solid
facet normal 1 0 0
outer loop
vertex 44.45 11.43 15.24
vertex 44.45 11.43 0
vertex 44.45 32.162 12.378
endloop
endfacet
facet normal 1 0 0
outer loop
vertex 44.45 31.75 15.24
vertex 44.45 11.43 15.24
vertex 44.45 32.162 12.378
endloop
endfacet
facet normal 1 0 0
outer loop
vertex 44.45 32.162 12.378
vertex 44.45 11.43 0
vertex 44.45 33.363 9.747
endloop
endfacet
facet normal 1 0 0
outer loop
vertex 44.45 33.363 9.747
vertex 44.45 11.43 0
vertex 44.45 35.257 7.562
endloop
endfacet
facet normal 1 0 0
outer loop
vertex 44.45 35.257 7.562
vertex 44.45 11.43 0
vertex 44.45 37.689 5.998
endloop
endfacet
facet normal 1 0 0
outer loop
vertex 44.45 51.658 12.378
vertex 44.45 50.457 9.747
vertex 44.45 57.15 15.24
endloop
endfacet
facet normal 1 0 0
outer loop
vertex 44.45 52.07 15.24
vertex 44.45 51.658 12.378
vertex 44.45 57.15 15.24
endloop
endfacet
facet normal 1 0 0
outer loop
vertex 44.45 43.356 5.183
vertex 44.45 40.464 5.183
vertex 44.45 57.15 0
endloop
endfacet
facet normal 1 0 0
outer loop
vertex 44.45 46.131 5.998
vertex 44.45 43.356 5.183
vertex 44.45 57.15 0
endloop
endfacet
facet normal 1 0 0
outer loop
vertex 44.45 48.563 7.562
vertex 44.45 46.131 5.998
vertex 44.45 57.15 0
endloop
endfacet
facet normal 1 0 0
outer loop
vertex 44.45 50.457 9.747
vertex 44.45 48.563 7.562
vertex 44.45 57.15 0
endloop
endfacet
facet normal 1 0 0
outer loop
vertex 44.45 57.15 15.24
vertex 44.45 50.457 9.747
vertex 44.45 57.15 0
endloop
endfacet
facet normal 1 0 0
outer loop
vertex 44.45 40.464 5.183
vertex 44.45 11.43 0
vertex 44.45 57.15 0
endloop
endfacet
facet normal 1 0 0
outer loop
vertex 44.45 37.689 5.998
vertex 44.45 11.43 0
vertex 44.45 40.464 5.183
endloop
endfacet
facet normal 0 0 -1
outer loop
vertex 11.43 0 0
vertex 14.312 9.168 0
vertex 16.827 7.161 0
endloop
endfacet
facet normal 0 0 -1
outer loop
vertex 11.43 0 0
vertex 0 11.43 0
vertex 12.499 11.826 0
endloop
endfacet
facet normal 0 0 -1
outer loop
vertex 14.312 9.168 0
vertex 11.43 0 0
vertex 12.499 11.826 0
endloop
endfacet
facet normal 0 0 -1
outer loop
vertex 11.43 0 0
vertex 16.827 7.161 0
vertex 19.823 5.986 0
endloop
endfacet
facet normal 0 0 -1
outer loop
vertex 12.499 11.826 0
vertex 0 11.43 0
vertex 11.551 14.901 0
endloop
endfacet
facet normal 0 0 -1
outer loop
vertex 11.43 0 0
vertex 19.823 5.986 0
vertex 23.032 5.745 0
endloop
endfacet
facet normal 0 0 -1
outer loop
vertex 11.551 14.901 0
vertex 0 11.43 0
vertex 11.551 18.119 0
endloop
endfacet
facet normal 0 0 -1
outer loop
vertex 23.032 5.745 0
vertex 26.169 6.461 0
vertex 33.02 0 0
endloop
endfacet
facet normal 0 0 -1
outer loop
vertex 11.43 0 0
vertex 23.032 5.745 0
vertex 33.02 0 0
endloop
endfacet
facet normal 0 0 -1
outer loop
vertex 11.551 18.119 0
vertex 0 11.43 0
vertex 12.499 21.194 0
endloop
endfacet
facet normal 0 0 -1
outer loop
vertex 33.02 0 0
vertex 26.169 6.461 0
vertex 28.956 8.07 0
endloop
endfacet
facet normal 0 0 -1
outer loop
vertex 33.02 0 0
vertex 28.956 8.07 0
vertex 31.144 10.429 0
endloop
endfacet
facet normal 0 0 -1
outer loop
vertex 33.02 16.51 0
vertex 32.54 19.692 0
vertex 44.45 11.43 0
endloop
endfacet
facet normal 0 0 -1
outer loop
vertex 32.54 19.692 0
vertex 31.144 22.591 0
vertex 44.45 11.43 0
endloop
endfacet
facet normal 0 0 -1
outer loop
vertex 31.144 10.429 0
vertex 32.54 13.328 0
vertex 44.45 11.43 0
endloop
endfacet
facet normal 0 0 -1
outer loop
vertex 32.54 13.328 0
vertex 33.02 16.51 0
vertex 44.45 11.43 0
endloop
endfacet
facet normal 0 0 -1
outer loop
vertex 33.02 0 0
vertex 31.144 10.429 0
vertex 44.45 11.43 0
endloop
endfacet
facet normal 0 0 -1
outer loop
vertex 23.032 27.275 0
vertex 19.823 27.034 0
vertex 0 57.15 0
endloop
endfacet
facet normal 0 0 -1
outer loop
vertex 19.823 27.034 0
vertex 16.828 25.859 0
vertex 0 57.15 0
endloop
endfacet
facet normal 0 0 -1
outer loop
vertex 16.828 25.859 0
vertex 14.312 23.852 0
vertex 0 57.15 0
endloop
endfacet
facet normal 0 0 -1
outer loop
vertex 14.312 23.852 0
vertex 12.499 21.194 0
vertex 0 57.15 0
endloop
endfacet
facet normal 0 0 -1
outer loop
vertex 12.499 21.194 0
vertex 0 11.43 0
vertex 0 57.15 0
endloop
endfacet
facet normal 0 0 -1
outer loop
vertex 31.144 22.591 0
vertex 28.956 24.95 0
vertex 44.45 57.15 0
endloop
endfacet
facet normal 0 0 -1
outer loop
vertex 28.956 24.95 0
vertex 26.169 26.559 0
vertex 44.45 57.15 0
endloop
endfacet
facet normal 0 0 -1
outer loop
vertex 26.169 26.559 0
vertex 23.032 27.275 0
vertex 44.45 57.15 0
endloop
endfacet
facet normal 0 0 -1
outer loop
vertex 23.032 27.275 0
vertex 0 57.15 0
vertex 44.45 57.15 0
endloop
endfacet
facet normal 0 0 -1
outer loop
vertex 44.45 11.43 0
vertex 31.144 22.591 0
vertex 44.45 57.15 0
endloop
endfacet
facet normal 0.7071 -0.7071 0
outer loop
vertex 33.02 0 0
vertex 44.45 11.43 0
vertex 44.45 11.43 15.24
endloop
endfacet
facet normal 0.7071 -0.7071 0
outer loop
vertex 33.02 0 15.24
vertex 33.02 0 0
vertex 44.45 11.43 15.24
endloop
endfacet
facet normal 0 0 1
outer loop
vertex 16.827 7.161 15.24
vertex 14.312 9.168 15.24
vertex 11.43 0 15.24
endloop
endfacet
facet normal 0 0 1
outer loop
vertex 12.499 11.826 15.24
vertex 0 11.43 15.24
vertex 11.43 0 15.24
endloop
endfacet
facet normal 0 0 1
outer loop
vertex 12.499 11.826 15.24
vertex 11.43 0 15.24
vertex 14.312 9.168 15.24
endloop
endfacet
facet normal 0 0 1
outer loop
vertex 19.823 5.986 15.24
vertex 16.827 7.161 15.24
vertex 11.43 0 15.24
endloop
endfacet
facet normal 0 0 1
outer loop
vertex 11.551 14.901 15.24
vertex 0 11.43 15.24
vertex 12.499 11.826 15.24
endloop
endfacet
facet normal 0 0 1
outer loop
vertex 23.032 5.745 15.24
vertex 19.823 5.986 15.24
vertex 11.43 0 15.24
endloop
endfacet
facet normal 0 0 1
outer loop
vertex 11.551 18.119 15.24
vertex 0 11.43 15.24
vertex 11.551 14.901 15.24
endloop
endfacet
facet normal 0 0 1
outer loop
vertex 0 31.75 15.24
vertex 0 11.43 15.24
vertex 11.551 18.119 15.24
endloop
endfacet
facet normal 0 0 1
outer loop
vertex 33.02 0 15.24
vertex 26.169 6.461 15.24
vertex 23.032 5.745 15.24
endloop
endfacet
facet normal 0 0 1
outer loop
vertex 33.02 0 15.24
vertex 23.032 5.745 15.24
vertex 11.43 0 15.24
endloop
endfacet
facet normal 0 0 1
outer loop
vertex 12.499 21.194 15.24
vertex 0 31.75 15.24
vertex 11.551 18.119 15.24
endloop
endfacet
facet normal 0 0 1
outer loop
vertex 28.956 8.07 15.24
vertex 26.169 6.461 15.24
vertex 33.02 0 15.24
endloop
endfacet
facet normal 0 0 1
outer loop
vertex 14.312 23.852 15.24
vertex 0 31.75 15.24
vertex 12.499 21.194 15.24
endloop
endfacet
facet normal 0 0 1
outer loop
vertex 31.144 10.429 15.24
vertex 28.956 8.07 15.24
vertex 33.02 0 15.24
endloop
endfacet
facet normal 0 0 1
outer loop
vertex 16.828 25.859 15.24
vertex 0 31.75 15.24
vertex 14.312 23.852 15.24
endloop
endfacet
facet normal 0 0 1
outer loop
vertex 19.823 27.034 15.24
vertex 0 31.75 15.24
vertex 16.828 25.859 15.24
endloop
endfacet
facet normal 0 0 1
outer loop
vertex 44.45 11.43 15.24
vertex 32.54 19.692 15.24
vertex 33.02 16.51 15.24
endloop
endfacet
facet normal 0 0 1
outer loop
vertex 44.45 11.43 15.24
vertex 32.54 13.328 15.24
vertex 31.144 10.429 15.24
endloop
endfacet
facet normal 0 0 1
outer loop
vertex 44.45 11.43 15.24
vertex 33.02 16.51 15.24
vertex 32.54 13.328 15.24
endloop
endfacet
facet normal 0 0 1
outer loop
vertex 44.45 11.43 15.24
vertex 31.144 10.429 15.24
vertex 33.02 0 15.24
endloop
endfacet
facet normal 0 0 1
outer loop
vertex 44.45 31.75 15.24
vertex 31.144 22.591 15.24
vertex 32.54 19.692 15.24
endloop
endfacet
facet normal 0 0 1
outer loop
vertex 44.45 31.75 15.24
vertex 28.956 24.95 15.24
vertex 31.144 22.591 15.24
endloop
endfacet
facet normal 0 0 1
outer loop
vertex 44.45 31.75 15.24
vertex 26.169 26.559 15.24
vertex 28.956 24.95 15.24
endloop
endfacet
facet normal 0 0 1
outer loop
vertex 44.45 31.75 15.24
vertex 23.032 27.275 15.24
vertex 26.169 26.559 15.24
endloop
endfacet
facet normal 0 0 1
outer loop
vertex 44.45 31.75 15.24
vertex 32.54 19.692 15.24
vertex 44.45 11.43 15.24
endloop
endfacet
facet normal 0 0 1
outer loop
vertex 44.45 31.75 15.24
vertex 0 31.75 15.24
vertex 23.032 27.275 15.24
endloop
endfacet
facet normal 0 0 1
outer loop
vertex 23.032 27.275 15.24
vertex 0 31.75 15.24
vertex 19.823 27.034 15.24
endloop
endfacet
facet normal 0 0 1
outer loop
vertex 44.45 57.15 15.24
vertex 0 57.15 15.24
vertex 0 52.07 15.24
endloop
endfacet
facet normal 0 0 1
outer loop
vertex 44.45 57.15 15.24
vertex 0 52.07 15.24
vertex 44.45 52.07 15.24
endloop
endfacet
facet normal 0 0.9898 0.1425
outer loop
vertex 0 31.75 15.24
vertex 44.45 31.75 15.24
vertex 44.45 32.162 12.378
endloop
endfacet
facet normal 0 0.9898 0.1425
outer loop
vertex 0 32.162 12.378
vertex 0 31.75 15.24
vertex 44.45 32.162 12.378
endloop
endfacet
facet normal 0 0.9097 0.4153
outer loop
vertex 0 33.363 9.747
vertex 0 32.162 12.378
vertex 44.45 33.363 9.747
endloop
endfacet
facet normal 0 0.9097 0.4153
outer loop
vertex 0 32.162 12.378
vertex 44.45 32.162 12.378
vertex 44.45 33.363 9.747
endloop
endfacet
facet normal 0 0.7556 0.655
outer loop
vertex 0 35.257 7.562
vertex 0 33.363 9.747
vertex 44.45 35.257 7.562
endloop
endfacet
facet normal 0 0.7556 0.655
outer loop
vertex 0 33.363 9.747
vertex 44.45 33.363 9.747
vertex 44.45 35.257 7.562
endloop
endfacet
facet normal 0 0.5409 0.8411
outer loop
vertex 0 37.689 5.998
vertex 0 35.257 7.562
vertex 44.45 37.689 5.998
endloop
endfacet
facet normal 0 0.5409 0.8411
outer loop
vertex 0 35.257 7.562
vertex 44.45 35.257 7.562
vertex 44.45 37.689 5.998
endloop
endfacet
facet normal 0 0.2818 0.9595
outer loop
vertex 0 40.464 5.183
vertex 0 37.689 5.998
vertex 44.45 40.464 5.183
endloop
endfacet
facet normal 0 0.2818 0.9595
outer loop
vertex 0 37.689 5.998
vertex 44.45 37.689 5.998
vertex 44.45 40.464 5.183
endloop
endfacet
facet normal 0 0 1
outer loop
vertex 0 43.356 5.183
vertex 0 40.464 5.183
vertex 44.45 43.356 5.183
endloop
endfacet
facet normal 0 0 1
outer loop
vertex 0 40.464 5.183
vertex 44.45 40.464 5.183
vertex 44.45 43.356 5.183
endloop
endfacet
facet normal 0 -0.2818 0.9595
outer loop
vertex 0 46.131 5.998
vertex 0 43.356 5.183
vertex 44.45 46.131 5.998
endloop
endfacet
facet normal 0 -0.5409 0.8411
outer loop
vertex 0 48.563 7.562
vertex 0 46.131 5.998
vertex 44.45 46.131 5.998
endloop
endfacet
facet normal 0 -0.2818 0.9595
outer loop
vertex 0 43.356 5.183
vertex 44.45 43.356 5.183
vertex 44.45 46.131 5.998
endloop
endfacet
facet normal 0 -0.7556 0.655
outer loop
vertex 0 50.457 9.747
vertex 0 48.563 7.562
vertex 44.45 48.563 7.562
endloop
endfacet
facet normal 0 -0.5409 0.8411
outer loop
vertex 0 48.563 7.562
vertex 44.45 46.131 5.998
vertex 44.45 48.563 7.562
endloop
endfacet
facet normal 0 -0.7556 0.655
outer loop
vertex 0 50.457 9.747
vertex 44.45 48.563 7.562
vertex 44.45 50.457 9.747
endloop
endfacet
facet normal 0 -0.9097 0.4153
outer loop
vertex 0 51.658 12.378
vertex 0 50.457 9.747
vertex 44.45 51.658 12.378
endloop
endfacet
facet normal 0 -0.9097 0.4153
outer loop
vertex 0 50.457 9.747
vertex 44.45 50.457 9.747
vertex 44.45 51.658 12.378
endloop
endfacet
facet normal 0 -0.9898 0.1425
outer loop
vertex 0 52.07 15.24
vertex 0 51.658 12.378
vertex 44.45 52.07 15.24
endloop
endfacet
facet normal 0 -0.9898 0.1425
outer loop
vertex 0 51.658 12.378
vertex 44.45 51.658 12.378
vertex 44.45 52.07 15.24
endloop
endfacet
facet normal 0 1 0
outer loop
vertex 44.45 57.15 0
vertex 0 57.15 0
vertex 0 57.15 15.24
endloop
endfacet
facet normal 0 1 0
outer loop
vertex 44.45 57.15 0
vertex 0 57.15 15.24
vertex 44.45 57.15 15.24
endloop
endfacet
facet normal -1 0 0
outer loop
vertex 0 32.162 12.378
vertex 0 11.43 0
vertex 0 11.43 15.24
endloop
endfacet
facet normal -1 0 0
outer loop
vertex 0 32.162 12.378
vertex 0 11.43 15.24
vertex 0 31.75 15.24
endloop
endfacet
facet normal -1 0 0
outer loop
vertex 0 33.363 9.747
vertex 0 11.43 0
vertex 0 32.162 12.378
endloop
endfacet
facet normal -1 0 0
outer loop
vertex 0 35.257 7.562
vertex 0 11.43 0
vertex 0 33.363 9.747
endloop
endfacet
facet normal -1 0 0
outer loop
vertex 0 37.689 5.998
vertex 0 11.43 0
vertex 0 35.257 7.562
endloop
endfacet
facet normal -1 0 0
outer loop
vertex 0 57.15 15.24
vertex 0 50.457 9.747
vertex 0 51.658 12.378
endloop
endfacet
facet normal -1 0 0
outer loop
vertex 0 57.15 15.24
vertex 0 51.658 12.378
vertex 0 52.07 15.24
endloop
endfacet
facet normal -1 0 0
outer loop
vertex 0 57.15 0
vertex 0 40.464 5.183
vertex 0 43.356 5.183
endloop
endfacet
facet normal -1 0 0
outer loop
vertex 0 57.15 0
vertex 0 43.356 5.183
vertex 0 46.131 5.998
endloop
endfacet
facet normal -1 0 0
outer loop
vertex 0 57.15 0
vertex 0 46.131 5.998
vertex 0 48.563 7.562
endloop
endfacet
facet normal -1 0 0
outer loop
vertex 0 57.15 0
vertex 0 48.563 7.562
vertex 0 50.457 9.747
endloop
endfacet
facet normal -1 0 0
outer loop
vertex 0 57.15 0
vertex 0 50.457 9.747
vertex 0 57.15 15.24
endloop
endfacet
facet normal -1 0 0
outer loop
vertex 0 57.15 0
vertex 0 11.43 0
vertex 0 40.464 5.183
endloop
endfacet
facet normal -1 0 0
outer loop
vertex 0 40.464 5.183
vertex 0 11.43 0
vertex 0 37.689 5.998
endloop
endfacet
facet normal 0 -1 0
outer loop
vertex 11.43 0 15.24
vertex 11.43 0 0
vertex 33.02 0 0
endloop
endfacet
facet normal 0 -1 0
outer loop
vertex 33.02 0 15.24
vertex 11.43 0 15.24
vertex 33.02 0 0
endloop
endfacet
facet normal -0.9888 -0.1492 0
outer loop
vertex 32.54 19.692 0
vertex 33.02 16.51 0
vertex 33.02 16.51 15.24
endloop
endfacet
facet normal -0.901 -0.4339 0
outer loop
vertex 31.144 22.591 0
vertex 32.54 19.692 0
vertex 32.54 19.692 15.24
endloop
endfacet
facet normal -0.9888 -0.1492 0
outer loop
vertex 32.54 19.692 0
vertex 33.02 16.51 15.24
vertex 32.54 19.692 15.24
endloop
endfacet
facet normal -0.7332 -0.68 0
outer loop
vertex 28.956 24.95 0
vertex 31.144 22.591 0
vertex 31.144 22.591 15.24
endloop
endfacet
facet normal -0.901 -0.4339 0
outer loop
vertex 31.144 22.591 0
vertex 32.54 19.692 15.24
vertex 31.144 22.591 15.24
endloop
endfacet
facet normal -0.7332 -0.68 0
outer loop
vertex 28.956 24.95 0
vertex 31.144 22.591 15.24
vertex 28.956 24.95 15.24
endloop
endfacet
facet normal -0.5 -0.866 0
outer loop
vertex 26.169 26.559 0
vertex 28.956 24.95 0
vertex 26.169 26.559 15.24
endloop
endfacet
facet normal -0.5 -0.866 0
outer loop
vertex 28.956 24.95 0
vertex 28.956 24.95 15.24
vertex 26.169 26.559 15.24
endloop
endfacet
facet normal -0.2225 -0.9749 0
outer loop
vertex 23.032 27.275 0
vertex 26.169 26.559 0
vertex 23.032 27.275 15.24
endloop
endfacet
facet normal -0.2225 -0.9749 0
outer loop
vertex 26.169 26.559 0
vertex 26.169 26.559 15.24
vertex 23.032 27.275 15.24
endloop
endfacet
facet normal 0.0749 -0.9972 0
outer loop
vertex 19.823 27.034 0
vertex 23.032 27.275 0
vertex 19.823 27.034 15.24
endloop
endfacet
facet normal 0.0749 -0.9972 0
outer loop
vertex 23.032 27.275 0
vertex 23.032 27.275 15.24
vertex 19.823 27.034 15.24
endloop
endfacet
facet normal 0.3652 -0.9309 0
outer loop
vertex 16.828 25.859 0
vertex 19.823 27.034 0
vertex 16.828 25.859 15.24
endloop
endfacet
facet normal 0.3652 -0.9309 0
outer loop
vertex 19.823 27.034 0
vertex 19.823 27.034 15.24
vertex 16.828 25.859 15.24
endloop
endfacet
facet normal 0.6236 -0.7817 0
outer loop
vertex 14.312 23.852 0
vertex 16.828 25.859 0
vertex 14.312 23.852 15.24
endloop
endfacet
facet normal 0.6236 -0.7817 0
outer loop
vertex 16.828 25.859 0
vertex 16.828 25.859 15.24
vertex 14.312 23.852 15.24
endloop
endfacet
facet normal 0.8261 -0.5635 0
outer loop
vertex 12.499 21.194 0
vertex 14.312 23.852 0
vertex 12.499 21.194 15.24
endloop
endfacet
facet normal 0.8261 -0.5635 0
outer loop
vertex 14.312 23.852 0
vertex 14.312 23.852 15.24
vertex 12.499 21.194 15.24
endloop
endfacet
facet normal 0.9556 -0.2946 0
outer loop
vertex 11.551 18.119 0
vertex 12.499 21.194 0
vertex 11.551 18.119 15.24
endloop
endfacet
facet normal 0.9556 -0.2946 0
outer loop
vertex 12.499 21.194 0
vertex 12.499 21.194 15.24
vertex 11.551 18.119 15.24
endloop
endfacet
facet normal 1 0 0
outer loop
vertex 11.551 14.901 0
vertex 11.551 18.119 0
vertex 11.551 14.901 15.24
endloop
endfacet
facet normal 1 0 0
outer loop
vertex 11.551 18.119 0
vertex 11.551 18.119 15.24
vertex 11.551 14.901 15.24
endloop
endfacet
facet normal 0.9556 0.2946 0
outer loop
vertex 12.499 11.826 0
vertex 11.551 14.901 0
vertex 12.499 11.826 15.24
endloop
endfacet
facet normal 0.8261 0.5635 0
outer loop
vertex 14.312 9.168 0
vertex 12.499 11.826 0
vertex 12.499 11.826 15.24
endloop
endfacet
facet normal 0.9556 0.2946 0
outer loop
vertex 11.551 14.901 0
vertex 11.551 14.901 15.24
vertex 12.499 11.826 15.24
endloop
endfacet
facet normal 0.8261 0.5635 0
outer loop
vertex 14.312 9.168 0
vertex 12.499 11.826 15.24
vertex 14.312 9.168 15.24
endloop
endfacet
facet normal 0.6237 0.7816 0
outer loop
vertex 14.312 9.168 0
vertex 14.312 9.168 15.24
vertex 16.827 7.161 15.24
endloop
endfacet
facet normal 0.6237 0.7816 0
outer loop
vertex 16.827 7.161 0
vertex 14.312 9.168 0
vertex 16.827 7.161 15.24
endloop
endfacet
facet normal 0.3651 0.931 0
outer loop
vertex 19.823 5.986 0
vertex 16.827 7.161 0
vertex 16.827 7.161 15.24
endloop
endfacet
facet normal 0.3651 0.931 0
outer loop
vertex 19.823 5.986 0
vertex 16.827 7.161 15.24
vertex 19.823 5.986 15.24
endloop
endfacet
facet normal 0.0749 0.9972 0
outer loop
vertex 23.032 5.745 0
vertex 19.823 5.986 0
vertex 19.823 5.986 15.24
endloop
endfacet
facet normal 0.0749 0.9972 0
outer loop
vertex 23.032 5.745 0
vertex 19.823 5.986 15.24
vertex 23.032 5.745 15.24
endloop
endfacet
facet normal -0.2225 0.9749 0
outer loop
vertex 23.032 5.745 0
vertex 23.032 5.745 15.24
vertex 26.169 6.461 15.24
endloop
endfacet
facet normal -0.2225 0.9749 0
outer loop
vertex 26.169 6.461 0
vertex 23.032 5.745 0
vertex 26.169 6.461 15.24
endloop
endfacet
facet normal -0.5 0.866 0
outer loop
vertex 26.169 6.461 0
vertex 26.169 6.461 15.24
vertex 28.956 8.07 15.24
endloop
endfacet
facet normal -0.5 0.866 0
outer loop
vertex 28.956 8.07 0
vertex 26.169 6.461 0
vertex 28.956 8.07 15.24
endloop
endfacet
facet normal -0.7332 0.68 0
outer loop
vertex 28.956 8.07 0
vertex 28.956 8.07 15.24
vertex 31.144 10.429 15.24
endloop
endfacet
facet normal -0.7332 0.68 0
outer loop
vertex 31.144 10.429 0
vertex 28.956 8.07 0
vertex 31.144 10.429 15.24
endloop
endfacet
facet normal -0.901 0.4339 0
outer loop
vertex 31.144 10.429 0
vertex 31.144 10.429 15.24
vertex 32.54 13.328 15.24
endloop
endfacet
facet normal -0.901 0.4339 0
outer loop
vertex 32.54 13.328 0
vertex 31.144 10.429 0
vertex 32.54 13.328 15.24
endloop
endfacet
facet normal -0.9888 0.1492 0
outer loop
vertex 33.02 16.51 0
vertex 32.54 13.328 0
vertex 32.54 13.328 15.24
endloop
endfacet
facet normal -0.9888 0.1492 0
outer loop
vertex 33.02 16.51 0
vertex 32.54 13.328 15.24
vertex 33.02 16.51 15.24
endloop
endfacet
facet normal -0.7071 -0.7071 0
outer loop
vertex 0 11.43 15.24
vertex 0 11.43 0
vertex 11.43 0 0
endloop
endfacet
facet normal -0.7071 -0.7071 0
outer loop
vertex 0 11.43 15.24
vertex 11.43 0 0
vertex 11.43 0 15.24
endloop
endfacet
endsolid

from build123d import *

# Parameters (mm, degrees)
F0_W     = 44.45
F0_H     = 57.15
F1_DEPTH = 15.24
F2_SIZE  = 11.43
F3_R     = 10.795
F4_DEPTH = 25.4
F6_DEPTH = 76.2


with BuildPart() as f1:
    # F0 (on Top) → F1 (new body)
    with BuildSketch(Plane.XY):
        with Locations((22.225, 28.575)):
            Rectangle(F0_W, F0_H)
    extrude(amount=F1_DEPTH)

    # F2
    f2_edges = [f1.edges().sort_by_distance(p)[0] for p in [
        (0, 0, 7.62),
        (44.45, 0, 7.62),
    ]]
    chamfer(f2_edges, length=F2_SIZE)

    # F3 (on face) → F4 (cut)
    with BuildSketch(Plane.XY.offset(15.24)):
        with Locations((22.225, 16.51)):
            Circle(F3_R)
    extrude(amount=-F4_DEPTH, mode=Mode.SUBTRACT)

    # F5 (on face) → F6 (cut)
    with BuildSketch(Plane.YZ.offset(44.45)):
        with BuildLine():
            Line((52.07, 15.24), (31.75, 15.24))
            ThreePointArc((31.75, 15.24), (41.91, 5.08), (52.07, 15.24))
        make_face()
    extrude(amount=-F6_DEPTH, mode=Mode.SUBTRACT)


solid = f1.part
